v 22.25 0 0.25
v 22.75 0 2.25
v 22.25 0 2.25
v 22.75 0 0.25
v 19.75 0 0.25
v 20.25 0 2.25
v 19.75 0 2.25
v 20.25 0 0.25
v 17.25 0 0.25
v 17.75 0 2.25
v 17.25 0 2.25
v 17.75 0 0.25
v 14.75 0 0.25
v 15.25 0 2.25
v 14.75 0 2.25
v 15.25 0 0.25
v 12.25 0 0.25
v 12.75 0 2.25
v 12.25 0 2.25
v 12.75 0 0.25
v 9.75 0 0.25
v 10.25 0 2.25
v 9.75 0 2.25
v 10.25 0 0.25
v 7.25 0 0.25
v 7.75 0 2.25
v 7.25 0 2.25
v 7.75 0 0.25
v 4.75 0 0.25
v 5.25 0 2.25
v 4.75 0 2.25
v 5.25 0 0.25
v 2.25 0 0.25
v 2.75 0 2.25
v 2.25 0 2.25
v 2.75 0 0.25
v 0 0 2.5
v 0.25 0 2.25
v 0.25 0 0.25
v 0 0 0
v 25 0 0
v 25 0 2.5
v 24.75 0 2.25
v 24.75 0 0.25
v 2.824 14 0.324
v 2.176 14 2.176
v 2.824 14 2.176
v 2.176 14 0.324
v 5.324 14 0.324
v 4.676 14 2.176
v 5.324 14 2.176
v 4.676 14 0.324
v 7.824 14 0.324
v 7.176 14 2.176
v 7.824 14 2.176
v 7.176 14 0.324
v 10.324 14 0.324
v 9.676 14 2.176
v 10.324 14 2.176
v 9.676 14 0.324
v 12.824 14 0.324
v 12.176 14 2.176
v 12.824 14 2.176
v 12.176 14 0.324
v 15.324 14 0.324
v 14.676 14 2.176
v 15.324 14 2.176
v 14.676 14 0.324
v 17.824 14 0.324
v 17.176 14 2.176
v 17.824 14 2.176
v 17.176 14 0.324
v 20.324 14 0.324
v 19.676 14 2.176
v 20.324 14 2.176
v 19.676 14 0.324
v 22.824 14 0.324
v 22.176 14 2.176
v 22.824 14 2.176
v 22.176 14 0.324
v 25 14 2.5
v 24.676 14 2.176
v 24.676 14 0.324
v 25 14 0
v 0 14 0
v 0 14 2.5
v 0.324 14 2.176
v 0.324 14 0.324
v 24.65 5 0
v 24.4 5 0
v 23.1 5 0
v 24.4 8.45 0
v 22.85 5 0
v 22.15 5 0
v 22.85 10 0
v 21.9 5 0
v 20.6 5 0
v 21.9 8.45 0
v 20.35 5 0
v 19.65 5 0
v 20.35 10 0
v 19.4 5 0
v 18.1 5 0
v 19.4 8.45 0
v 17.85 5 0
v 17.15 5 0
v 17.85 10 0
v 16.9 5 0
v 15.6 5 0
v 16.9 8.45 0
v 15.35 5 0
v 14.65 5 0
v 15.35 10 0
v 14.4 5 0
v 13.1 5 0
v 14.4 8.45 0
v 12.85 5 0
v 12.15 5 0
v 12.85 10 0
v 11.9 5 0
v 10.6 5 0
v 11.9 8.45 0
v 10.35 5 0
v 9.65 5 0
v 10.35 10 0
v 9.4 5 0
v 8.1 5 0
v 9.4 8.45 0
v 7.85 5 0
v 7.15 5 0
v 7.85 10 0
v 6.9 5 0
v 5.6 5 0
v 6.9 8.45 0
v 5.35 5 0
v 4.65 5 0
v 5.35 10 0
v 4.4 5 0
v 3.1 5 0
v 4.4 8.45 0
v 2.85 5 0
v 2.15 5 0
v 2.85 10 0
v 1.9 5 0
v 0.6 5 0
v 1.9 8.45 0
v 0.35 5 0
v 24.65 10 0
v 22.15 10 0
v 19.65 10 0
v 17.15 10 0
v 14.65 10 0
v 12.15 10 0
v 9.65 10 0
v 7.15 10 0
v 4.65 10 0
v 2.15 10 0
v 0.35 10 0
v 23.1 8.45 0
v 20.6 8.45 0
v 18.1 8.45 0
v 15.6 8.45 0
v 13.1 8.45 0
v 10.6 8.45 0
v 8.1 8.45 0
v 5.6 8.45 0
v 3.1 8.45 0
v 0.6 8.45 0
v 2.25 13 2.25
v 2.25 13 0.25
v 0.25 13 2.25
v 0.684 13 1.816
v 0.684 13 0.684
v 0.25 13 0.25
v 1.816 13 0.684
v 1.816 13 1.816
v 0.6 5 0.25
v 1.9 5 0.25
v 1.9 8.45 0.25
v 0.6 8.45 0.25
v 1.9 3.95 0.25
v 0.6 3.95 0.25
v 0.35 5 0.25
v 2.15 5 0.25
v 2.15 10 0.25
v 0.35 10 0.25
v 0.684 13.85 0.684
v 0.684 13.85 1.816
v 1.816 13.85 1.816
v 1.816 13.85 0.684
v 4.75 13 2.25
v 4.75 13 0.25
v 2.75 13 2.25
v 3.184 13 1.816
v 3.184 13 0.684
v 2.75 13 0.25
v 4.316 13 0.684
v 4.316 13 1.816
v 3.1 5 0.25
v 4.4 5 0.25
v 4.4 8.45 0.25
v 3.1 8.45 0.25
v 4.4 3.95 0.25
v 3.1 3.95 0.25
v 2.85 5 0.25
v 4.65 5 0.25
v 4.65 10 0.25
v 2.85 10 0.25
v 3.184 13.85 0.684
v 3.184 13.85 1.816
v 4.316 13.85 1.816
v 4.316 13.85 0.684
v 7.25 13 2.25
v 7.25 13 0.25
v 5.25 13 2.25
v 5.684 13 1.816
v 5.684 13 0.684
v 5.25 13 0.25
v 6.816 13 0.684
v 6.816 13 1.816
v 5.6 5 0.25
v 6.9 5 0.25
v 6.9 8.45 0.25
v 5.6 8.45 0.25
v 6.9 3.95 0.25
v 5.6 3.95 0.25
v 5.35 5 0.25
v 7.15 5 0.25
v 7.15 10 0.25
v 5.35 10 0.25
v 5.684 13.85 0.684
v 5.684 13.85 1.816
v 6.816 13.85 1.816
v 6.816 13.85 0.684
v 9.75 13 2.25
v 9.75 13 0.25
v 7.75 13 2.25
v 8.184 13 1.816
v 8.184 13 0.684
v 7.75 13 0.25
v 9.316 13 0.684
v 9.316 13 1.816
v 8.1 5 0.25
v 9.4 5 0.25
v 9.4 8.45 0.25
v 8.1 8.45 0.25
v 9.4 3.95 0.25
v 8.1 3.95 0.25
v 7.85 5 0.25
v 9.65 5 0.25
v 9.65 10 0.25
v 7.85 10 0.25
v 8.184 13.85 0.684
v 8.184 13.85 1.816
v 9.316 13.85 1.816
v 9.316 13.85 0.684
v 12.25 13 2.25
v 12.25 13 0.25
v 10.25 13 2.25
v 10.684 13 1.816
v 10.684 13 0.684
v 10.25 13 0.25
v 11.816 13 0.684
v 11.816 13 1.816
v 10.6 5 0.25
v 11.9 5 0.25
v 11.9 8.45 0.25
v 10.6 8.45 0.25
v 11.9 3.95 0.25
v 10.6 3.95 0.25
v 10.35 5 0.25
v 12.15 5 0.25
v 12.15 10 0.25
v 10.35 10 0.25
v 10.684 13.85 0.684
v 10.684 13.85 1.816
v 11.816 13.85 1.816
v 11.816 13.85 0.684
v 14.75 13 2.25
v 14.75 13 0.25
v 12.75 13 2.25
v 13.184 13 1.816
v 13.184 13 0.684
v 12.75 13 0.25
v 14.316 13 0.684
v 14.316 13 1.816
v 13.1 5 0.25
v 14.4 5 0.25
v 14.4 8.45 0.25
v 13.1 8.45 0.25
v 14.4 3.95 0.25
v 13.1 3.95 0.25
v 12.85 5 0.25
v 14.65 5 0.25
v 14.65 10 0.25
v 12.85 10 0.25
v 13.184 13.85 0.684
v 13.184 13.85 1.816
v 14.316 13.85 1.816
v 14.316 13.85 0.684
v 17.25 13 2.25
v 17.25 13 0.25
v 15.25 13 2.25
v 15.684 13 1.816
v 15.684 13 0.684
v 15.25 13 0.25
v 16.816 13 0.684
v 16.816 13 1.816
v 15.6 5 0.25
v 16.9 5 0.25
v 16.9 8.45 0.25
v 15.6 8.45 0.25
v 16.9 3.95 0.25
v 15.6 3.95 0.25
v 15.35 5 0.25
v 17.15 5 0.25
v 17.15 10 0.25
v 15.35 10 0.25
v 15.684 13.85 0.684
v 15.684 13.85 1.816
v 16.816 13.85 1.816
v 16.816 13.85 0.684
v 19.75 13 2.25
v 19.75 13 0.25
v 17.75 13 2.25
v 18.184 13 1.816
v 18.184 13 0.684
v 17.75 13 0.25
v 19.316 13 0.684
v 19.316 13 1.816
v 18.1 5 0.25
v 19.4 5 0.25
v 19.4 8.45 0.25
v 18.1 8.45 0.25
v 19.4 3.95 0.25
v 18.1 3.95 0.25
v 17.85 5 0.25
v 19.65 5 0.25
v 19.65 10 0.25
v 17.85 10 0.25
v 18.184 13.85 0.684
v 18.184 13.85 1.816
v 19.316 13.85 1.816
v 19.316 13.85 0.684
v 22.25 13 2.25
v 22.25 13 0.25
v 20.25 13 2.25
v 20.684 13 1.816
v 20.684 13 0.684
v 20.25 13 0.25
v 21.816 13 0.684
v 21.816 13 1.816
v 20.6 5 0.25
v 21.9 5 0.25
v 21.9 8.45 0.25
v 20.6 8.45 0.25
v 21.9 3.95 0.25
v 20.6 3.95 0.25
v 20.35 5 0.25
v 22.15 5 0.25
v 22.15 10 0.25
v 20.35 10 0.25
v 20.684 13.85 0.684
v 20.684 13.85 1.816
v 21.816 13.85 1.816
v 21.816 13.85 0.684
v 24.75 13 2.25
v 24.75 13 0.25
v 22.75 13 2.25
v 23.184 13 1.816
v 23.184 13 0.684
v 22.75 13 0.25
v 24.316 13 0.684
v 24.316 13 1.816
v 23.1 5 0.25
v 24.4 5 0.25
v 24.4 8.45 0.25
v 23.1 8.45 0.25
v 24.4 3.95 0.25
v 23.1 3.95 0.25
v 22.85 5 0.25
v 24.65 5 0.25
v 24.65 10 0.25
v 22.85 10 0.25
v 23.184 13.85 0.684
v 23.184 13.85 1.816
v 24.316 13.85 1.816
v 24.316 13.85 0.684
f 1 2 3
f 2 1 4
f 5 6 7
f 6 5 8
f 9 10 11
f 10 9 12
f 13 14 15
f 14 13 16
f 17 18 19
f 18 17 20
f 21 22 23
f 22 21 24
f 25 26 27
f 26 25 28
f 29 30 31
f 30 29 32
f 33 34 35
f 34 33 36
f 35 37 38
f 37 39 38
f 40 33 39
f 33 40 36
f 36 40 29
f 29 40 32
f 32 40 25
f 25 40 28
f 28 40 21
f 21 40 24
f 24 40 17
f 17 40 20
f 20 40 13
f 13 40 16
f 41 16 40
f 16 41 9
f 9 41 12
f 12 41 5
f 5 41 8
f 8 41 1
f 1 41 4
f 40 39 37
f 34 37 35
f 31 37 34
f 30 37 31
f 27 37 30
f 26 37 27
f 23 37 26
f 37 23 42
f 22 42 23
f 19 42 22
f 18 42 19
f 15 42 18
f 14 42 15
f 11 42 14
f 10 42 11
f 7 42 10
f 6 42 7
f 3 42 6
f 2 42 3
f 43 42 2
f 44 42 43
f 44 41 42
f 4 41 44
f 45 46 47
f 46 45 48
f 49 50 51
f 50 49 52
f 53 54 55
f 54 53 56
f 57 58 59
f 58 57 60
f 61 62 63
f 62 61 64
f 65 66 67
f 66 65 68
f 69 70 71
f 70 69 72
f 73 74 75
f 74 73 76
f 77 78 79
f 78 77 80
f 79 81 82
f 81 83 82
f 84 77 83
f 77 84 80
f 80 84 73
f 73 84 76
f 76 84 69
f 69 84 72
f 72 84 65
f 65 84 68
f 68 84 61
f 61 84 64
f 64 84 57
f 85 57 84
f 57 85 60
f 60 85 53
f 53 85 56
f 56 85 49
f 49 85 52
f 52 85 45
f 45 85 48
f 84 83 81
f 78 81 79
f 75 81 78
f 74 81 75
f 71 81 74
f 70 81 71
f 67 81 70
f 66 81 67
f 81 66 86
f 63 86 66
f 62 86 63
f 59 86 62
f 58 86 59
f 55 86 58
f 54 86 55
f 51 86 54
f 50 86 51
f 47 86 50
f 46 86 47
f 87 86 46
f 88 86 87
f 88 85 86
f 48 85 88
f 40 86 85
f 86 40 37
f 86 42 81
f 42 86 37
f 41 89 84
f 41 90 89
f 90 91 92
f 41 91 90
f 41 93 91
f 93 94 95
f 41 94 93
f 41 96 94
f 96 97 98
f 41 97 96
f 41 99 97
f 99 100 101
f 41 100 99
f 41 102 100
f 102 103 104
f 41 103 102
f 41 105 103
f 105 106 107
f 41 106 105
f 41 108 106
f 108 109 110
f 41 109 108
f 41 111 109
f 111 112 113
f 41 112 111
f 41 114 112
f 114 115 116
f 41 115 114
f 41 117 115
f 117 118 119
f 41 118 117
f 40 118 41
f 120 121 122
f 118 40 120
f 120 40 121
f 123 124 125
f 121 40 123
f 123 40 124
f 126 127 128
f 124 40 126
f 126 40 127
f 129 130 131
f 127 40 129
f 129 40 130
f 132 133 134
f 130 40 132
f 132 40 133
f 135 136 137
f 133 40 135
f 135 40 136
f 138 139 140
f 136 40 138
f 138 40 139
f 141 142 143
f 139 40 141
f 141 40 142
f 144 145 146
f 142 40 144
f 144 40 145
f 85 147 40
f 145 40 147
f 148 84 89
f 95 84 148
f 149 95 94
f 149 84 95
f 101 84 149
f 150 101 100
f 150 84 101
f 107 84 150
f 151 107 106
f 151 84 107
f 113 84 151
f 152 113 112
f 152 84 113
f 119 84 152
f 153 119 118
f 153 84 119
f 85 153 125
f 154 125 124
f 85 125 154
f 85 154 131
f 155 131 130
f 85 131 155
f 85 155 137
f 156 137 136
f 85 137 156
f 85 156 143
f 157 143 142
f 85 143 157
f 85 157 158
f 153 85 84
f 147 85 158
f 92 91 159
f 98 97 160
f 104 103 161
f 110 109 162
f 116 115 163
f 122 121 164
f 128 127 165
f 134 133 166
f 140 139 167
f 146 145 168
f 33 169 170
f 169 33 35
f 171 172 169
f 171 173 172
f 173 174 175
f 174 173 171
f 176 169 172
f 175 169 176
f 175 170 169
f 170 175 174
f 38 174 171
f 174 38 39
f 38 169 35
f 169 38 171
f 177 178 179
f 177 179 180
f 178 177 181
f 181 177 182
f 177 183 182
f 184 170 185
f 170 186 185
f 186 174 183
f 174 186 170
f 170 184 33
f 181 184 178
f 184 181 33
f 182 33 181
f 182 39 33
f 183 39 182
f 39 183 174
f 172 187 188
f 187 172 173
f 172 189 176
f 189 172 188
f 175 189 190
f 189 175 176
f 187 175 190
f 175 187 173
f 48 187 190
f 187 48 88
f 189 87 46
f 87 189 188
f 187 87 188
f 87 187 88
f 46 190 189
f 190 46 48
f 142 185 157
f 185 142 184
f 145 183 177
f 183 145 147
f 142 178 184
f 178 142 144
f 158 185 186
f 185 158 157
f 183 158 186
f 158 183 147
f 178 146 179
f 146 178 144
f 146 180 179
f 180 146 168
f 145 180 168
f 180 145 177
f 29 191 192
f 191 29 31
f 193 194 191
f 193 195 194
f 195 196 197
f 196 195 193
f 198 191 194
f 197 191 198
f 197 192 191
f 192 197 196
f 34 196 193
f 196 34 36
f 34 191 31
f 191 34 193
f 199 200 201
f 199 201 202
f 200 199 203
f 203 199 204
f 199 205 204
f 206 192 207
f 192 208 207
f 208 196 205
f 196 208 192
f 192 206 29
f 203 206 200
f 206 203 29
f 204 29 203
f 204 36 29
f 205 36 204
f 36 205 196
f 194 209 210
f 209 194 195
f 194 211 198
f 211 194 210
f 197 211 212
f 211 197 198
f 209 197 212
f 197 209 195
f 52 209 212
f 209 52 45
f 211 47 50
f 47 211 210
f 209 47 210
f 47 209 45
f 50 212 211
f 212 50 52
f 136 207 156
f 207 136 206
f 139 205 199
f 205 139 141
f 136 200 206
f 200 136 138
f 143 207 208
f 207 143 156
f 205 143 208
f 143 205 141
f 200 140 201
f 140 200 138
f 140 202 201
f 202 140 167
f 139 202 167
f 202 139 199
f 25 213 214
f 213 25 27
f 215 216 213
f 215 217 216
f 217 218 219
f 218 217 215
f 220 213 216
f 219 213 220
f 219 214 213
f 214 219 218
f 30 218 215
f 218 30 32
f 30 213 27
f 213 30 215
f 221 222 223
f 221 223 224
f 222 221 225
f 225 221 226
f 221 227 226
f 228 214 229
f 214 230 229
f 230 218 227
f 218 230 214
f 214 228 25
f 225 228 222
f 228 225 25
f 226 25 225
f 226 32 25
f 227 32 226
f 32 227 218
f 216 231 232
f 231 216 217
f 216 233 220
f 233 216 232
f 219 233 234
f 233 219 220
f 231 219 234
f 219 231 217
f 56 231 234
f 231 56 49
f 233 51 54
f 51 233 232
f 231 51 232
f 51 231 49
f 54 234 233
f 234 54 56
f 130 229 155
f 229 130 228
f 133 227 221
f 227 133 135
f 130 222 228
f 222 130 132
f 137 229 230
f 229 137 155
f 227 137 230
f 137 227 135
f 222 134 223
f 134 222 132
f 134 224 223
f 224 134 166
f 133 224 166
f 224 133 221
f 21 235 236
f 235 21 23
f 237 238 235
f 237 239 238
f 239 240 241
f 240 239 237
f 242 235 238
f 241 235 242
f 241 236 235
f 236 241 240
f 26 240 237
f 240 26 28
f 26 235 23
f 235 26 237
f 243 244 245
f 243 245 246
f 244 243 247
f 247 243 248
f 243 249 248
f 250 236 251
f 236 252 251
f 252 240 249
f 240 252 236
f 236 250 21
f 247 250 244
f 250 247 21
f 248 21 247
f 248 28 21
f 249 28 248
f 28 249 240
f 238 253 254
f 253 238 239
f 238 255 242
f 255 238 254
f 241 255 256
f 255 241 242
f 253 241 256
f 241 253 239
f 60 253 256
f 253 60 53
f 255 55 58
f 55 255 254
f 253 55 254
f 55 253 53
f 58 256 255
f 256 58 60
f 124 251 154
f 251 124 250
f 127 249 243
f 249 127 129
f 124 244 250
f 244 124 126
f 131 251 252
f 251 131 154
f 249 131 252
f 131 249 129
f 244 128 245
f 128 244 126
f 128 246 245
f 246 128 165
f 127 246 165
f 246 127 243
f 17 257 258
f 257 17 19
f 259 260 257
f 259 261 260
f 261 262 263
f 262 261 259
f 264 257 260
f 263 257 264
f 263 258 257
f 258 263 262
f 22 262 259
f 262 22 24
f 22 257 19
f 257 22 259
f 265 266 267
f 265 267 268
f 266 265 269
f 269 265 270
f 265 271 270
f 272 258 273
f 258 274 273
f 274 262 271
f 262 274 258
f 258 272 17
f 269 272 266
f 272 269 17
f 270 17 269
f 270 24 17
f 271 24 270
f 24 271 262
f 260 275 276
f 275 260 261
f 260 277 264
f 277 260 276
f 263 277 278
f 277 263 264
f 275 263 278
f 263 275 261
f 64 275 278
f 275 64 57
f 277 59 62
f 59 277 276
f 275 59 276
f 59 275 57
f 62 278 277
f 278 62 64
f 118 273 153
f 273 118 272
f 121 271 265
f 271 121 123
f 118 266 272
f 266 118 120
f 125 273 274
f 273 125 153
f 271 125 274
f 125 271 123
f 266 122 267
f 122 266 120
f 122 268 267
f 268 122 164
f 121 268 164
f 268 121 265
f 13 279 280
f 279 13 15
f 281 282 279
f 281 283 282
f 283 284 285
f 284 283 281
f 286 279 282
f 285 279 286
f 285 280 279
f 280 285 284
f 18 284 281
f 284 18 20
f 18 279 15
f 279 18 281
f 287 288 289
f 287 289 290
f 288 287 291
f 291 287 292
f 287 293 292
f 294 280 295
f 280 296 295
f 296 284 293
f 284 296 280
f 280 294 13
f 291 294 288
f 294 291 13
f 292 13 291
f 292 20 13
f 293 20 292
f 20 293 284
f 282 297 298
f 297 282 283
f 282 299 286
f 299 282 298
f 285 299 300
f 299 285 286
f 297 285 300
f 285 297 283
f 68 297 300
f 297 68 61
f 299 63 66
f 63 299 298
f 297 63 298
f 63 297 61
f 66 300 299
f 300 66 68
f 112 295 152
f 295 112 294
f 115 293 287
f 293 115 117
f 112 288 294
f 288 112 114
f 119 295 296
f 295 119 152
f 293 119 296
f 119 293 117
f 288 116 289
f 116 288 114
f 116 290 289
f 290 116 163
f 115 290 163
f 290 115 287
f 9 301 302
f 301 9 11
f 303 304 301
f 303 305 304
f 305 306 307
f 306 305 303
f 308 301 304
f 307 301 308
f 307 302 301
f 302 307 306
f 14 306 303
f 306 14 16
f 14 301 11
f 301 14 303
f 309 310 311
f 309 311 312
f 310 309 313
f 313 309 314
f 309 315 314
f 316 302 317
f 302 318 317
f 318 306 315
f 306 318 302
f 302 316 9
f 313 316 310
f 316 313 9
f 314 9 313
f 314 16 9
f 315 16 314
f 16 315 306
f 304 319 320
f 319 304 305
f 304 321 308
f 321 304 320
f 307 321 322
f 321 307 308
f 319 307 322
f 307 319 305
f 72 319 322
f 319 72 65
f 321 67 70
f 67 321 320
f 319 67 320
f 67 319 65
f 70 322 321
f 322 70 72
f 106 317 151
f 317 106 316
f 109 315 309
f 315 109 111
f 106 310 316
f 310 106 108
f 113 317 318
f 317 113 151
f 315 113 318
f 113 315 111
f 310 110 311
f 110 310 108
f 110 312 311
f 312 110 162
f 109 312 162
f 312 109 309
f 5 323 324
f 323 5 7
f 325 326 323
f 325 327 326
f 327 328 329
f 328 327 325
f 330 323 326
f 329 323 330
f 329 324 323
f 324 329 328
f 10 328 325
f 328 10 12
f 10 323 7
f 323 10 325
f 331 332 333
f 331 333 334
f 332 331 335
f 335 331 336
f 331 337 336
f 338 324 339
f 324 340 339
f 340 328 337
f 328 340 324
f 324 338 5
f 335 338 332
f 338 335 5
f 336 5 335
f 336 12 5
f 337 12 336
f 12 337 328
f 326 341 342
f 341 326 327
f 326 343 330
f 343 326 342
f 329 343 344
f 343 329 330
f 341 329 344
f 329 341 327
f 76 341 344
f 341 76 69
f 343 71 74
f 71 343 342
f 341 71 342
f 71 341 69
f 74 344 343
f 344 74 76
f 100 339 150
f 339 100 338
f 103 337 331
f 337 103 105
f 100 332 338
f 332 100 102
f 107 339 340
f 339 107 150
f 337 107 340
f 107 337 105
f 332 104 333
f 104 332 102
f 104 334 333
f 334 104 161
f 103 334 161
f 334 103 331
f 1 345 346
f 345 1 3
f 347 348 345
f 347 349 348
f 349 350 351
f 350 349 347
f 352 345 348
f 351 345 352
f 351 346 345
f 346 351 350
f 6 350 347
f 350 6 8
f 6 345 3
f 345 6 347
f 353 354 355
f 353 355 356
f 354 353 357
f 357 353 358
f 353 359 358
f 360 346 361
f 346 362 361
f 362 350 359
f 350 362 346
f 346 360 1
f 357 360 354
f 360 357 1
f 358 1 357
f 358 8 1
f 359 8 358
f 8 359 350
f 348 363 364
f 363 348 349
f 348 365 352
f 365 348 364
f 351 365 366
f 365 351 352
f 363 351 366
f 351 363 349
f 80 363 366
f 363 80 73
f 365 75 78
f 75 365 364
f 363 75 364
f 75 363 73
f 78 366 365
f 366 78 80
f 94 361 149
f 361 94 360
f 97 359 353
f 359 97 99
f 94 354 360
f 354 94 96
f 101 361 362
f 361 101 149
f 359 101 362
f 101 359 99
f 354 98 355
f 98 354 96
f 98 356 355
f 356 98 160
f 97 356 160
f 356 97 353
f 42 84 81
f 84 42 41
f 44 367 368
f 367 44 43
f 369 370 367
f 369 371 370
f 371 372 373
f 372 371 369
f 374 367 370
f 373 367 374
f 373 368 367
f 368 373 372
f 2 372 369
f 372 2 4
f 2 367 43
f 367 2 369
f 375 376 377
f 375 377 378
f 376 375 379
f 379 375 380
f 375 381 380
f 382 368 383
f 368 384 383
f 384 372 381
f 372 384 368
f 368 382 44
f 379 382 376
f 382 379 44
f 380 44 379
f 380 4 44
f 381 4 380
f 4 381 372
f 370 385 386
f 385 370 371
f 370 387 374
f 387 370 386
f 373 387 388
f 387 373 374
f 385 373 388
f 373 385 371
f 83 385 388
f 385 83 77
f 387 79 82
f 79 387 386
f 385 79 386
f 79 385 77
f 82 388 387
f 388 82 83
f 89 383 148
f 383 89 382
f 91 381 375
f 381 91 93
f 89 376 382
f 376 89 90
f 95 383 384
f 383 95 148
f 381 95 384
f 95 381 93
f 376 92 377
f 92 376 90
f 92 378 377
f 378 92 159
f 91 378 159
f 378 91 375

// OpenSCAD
//the number of "shells" to make
count = 10; // [1:10]

module shell() {
    translate([2.5/2, 7, 2.5/2]) 
    rotate([90, 0, 0])
    union() {
        difference() {
            cube([2.5, 2.5, 14], center=true);
            // inner hole/hollow
            translate([0, 0, 1])
                cube([2, 2, 14], center=true);
            // pin hole
            rotate([0, 0, 45])
                cylinder(r=0.8, h=60, center=true, $fn=4);
            // chamfer
            translate([0, 0, -7.1]) rotate([0, 0, 45]) 
                cylinder(r1=2.5, r2=0.8, h=0.5, center=true, $fn=4);
            // tab hole 
            translate([0, -1, -0.5])
            cube([1.8, 1, 5], center=true);
        }
        // tab
        translate([0, -1.125, 0.8])
            cube([1.3, 0.25, 4.5], center=true);
    }
}


for(i = [0:count-1]) 
    translate([2.5*i, 0, 0])
        shell();
